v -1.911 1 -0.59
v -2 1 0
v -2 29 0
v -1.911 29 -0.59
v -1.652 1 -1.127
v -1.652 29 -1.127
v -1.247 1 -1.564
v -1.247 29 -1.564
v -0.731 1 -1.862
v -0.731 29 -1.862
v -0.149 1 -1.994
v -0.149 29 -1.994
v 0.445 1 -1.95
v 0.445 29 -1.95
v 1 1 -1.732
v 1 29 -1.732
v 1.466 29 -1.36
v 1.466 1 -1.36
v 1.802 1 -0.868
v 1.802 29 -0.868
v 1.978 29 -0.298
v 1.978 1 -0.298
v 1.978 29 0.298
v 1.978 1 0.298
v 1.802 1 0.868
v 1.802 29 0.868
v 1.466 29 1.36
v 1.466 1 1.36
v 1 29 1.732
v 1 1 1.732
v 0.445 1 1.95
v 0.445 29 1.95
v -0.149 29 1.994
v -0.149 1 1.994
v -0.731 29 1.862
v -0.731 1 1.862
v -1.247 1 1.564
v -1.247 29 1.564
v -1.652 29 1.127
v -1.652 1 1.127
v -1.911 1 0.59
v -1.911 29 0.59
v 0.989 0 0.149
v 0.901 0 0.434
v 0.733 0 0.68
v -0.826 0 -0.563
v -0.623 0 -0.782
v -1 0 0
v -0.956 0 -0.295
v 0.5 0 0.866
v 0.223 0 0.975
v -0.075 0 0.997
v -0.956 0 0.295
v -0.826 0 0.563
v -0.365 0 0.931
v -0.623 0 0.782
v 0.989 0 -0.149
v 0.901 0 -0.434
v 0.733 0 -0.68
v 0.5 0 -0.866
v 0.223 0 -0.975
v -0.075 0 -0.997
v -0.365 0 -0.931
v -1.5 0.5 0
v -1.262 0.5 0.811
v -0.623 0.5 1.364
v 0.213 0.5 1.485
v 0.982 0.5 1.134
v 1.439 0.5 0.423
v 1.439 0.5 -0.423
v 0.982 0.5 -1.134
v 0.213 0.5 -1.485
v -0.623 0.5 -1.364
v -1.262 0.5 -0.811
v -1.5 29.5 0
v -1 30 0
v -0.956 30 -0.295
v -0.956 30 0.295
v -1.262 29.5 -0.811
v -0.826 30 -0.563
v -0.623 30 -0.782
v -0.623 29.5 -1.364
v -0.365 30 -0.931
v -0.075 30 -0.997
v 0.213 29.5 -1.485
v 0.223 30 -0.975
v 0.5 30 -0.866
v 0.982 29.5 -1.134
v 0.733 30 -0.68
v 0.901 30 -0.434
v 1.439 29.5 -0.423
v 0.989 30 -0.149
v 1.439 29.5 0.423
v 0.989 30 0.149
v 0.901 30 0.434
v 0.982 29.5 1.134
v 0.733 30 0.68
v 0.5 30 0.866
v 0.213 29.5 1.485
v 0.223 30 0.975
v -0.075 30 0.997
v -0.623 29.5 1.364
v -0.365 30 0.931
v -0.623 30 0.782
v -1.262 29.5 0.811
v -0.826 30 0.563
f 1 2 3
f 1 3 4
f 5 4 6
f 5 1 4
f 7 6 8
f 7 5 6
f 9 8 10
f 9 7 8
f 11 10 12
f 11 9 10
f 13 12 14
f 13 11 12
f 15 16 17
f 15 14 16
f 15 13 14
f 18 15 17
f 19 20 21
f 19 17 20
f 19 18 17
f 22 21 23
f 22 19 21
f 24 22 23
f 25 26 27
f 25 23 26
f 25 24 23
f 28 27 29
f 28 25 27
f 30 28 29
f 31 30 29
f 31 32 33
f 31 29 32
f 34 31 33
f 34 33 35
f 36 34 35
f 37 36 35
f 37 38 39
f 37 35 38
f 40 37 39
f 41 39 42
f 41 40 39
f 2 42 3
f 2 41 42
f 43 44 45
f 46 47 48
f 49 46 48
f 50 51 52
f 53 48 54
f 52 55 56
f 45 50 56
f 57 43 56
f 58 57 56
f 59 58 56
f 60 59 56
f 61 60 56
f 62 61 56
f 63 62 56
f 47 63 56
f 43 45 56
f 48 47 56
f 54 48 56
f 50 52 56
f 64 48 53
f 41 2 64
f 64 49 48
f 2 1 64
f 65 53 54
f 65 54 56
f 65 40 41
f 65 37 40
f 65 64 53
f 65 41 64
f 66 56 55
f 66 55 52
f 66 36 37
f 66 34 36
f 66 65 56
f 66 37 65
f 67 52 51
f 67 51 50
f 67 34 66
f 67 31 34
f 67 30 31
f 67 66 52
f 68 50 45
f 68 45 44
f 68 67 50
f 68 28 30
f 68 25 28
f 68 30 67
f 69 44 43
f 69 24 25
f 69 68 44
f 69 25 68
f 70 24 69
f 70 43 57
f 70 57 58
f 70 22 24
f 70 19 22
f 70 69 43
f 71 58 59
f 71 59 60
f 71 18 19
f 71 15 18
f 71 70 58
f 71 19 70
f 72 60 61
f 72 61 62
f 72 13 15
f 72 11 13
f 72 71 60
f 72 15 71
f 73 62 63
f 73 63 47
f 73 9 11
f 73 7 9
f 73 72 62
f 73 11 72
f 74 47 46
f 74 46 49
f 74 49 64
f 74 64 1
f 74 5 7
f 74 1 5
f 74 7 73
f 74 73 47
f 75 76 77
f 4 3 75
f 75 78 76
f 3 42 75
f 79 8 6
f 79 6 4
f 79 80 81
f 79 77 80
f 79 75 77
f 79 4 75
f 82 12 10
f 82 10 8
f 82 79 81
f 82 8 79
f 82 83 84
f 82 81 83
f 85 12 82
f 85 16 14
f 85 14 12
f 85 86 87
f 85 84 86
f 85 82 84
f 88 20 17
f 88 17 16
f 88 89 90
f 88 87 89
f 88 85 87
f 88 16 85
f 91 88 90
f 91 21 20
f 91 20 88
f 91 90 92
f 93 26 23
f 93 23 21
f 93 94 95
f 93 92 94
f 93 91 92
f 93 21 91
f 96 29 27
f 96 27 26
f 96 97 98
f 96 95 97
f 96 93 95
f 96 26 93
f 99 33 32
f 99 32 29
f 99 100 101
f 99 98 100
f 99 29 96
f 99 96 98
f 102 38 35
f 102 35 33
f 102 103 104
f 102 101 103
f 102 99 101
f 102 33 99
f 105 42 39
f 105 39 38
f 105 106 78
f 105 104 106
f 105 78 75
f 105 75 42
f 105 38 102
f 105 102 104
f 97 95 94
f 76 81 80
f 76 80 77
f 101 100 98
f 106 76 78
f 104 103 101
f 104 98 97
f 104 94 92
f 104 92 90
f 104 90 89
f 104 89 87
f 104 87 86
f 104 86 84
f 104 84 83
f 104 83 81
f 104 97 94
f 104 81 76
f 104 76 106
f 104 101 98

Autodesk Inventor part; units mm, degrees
ref_plane "YZ Plane" through (0, 0, 0) normal (1, 0, 0) x (0, 1, 0)
ref_plane "XZ Plane" through (0, 0, 0) normal (0, 1, 0) x (-1, 0, 0)
ref_plane "XY Plane" through (0, 0, 0) normal (0, 0, 1) x (1, 0, 0)
sketch "Sketch1" plane through (0, 0, 0) normal (0, 1, 0) x (-1, 0, 0)
  circle A0 centre (0, 0) radius 2
  dimension "d0" = 4
extrude "Extrusion1" add sketch "Sketch1" along normal blind 30
chamfer "Chamfer1" distance 1 angle 45 1 edges at (2, 0, 0)
chamfer "Chamfer2" distance 1 angle 45 1 edges at (2, 30, 0)
properties part number "thread"
